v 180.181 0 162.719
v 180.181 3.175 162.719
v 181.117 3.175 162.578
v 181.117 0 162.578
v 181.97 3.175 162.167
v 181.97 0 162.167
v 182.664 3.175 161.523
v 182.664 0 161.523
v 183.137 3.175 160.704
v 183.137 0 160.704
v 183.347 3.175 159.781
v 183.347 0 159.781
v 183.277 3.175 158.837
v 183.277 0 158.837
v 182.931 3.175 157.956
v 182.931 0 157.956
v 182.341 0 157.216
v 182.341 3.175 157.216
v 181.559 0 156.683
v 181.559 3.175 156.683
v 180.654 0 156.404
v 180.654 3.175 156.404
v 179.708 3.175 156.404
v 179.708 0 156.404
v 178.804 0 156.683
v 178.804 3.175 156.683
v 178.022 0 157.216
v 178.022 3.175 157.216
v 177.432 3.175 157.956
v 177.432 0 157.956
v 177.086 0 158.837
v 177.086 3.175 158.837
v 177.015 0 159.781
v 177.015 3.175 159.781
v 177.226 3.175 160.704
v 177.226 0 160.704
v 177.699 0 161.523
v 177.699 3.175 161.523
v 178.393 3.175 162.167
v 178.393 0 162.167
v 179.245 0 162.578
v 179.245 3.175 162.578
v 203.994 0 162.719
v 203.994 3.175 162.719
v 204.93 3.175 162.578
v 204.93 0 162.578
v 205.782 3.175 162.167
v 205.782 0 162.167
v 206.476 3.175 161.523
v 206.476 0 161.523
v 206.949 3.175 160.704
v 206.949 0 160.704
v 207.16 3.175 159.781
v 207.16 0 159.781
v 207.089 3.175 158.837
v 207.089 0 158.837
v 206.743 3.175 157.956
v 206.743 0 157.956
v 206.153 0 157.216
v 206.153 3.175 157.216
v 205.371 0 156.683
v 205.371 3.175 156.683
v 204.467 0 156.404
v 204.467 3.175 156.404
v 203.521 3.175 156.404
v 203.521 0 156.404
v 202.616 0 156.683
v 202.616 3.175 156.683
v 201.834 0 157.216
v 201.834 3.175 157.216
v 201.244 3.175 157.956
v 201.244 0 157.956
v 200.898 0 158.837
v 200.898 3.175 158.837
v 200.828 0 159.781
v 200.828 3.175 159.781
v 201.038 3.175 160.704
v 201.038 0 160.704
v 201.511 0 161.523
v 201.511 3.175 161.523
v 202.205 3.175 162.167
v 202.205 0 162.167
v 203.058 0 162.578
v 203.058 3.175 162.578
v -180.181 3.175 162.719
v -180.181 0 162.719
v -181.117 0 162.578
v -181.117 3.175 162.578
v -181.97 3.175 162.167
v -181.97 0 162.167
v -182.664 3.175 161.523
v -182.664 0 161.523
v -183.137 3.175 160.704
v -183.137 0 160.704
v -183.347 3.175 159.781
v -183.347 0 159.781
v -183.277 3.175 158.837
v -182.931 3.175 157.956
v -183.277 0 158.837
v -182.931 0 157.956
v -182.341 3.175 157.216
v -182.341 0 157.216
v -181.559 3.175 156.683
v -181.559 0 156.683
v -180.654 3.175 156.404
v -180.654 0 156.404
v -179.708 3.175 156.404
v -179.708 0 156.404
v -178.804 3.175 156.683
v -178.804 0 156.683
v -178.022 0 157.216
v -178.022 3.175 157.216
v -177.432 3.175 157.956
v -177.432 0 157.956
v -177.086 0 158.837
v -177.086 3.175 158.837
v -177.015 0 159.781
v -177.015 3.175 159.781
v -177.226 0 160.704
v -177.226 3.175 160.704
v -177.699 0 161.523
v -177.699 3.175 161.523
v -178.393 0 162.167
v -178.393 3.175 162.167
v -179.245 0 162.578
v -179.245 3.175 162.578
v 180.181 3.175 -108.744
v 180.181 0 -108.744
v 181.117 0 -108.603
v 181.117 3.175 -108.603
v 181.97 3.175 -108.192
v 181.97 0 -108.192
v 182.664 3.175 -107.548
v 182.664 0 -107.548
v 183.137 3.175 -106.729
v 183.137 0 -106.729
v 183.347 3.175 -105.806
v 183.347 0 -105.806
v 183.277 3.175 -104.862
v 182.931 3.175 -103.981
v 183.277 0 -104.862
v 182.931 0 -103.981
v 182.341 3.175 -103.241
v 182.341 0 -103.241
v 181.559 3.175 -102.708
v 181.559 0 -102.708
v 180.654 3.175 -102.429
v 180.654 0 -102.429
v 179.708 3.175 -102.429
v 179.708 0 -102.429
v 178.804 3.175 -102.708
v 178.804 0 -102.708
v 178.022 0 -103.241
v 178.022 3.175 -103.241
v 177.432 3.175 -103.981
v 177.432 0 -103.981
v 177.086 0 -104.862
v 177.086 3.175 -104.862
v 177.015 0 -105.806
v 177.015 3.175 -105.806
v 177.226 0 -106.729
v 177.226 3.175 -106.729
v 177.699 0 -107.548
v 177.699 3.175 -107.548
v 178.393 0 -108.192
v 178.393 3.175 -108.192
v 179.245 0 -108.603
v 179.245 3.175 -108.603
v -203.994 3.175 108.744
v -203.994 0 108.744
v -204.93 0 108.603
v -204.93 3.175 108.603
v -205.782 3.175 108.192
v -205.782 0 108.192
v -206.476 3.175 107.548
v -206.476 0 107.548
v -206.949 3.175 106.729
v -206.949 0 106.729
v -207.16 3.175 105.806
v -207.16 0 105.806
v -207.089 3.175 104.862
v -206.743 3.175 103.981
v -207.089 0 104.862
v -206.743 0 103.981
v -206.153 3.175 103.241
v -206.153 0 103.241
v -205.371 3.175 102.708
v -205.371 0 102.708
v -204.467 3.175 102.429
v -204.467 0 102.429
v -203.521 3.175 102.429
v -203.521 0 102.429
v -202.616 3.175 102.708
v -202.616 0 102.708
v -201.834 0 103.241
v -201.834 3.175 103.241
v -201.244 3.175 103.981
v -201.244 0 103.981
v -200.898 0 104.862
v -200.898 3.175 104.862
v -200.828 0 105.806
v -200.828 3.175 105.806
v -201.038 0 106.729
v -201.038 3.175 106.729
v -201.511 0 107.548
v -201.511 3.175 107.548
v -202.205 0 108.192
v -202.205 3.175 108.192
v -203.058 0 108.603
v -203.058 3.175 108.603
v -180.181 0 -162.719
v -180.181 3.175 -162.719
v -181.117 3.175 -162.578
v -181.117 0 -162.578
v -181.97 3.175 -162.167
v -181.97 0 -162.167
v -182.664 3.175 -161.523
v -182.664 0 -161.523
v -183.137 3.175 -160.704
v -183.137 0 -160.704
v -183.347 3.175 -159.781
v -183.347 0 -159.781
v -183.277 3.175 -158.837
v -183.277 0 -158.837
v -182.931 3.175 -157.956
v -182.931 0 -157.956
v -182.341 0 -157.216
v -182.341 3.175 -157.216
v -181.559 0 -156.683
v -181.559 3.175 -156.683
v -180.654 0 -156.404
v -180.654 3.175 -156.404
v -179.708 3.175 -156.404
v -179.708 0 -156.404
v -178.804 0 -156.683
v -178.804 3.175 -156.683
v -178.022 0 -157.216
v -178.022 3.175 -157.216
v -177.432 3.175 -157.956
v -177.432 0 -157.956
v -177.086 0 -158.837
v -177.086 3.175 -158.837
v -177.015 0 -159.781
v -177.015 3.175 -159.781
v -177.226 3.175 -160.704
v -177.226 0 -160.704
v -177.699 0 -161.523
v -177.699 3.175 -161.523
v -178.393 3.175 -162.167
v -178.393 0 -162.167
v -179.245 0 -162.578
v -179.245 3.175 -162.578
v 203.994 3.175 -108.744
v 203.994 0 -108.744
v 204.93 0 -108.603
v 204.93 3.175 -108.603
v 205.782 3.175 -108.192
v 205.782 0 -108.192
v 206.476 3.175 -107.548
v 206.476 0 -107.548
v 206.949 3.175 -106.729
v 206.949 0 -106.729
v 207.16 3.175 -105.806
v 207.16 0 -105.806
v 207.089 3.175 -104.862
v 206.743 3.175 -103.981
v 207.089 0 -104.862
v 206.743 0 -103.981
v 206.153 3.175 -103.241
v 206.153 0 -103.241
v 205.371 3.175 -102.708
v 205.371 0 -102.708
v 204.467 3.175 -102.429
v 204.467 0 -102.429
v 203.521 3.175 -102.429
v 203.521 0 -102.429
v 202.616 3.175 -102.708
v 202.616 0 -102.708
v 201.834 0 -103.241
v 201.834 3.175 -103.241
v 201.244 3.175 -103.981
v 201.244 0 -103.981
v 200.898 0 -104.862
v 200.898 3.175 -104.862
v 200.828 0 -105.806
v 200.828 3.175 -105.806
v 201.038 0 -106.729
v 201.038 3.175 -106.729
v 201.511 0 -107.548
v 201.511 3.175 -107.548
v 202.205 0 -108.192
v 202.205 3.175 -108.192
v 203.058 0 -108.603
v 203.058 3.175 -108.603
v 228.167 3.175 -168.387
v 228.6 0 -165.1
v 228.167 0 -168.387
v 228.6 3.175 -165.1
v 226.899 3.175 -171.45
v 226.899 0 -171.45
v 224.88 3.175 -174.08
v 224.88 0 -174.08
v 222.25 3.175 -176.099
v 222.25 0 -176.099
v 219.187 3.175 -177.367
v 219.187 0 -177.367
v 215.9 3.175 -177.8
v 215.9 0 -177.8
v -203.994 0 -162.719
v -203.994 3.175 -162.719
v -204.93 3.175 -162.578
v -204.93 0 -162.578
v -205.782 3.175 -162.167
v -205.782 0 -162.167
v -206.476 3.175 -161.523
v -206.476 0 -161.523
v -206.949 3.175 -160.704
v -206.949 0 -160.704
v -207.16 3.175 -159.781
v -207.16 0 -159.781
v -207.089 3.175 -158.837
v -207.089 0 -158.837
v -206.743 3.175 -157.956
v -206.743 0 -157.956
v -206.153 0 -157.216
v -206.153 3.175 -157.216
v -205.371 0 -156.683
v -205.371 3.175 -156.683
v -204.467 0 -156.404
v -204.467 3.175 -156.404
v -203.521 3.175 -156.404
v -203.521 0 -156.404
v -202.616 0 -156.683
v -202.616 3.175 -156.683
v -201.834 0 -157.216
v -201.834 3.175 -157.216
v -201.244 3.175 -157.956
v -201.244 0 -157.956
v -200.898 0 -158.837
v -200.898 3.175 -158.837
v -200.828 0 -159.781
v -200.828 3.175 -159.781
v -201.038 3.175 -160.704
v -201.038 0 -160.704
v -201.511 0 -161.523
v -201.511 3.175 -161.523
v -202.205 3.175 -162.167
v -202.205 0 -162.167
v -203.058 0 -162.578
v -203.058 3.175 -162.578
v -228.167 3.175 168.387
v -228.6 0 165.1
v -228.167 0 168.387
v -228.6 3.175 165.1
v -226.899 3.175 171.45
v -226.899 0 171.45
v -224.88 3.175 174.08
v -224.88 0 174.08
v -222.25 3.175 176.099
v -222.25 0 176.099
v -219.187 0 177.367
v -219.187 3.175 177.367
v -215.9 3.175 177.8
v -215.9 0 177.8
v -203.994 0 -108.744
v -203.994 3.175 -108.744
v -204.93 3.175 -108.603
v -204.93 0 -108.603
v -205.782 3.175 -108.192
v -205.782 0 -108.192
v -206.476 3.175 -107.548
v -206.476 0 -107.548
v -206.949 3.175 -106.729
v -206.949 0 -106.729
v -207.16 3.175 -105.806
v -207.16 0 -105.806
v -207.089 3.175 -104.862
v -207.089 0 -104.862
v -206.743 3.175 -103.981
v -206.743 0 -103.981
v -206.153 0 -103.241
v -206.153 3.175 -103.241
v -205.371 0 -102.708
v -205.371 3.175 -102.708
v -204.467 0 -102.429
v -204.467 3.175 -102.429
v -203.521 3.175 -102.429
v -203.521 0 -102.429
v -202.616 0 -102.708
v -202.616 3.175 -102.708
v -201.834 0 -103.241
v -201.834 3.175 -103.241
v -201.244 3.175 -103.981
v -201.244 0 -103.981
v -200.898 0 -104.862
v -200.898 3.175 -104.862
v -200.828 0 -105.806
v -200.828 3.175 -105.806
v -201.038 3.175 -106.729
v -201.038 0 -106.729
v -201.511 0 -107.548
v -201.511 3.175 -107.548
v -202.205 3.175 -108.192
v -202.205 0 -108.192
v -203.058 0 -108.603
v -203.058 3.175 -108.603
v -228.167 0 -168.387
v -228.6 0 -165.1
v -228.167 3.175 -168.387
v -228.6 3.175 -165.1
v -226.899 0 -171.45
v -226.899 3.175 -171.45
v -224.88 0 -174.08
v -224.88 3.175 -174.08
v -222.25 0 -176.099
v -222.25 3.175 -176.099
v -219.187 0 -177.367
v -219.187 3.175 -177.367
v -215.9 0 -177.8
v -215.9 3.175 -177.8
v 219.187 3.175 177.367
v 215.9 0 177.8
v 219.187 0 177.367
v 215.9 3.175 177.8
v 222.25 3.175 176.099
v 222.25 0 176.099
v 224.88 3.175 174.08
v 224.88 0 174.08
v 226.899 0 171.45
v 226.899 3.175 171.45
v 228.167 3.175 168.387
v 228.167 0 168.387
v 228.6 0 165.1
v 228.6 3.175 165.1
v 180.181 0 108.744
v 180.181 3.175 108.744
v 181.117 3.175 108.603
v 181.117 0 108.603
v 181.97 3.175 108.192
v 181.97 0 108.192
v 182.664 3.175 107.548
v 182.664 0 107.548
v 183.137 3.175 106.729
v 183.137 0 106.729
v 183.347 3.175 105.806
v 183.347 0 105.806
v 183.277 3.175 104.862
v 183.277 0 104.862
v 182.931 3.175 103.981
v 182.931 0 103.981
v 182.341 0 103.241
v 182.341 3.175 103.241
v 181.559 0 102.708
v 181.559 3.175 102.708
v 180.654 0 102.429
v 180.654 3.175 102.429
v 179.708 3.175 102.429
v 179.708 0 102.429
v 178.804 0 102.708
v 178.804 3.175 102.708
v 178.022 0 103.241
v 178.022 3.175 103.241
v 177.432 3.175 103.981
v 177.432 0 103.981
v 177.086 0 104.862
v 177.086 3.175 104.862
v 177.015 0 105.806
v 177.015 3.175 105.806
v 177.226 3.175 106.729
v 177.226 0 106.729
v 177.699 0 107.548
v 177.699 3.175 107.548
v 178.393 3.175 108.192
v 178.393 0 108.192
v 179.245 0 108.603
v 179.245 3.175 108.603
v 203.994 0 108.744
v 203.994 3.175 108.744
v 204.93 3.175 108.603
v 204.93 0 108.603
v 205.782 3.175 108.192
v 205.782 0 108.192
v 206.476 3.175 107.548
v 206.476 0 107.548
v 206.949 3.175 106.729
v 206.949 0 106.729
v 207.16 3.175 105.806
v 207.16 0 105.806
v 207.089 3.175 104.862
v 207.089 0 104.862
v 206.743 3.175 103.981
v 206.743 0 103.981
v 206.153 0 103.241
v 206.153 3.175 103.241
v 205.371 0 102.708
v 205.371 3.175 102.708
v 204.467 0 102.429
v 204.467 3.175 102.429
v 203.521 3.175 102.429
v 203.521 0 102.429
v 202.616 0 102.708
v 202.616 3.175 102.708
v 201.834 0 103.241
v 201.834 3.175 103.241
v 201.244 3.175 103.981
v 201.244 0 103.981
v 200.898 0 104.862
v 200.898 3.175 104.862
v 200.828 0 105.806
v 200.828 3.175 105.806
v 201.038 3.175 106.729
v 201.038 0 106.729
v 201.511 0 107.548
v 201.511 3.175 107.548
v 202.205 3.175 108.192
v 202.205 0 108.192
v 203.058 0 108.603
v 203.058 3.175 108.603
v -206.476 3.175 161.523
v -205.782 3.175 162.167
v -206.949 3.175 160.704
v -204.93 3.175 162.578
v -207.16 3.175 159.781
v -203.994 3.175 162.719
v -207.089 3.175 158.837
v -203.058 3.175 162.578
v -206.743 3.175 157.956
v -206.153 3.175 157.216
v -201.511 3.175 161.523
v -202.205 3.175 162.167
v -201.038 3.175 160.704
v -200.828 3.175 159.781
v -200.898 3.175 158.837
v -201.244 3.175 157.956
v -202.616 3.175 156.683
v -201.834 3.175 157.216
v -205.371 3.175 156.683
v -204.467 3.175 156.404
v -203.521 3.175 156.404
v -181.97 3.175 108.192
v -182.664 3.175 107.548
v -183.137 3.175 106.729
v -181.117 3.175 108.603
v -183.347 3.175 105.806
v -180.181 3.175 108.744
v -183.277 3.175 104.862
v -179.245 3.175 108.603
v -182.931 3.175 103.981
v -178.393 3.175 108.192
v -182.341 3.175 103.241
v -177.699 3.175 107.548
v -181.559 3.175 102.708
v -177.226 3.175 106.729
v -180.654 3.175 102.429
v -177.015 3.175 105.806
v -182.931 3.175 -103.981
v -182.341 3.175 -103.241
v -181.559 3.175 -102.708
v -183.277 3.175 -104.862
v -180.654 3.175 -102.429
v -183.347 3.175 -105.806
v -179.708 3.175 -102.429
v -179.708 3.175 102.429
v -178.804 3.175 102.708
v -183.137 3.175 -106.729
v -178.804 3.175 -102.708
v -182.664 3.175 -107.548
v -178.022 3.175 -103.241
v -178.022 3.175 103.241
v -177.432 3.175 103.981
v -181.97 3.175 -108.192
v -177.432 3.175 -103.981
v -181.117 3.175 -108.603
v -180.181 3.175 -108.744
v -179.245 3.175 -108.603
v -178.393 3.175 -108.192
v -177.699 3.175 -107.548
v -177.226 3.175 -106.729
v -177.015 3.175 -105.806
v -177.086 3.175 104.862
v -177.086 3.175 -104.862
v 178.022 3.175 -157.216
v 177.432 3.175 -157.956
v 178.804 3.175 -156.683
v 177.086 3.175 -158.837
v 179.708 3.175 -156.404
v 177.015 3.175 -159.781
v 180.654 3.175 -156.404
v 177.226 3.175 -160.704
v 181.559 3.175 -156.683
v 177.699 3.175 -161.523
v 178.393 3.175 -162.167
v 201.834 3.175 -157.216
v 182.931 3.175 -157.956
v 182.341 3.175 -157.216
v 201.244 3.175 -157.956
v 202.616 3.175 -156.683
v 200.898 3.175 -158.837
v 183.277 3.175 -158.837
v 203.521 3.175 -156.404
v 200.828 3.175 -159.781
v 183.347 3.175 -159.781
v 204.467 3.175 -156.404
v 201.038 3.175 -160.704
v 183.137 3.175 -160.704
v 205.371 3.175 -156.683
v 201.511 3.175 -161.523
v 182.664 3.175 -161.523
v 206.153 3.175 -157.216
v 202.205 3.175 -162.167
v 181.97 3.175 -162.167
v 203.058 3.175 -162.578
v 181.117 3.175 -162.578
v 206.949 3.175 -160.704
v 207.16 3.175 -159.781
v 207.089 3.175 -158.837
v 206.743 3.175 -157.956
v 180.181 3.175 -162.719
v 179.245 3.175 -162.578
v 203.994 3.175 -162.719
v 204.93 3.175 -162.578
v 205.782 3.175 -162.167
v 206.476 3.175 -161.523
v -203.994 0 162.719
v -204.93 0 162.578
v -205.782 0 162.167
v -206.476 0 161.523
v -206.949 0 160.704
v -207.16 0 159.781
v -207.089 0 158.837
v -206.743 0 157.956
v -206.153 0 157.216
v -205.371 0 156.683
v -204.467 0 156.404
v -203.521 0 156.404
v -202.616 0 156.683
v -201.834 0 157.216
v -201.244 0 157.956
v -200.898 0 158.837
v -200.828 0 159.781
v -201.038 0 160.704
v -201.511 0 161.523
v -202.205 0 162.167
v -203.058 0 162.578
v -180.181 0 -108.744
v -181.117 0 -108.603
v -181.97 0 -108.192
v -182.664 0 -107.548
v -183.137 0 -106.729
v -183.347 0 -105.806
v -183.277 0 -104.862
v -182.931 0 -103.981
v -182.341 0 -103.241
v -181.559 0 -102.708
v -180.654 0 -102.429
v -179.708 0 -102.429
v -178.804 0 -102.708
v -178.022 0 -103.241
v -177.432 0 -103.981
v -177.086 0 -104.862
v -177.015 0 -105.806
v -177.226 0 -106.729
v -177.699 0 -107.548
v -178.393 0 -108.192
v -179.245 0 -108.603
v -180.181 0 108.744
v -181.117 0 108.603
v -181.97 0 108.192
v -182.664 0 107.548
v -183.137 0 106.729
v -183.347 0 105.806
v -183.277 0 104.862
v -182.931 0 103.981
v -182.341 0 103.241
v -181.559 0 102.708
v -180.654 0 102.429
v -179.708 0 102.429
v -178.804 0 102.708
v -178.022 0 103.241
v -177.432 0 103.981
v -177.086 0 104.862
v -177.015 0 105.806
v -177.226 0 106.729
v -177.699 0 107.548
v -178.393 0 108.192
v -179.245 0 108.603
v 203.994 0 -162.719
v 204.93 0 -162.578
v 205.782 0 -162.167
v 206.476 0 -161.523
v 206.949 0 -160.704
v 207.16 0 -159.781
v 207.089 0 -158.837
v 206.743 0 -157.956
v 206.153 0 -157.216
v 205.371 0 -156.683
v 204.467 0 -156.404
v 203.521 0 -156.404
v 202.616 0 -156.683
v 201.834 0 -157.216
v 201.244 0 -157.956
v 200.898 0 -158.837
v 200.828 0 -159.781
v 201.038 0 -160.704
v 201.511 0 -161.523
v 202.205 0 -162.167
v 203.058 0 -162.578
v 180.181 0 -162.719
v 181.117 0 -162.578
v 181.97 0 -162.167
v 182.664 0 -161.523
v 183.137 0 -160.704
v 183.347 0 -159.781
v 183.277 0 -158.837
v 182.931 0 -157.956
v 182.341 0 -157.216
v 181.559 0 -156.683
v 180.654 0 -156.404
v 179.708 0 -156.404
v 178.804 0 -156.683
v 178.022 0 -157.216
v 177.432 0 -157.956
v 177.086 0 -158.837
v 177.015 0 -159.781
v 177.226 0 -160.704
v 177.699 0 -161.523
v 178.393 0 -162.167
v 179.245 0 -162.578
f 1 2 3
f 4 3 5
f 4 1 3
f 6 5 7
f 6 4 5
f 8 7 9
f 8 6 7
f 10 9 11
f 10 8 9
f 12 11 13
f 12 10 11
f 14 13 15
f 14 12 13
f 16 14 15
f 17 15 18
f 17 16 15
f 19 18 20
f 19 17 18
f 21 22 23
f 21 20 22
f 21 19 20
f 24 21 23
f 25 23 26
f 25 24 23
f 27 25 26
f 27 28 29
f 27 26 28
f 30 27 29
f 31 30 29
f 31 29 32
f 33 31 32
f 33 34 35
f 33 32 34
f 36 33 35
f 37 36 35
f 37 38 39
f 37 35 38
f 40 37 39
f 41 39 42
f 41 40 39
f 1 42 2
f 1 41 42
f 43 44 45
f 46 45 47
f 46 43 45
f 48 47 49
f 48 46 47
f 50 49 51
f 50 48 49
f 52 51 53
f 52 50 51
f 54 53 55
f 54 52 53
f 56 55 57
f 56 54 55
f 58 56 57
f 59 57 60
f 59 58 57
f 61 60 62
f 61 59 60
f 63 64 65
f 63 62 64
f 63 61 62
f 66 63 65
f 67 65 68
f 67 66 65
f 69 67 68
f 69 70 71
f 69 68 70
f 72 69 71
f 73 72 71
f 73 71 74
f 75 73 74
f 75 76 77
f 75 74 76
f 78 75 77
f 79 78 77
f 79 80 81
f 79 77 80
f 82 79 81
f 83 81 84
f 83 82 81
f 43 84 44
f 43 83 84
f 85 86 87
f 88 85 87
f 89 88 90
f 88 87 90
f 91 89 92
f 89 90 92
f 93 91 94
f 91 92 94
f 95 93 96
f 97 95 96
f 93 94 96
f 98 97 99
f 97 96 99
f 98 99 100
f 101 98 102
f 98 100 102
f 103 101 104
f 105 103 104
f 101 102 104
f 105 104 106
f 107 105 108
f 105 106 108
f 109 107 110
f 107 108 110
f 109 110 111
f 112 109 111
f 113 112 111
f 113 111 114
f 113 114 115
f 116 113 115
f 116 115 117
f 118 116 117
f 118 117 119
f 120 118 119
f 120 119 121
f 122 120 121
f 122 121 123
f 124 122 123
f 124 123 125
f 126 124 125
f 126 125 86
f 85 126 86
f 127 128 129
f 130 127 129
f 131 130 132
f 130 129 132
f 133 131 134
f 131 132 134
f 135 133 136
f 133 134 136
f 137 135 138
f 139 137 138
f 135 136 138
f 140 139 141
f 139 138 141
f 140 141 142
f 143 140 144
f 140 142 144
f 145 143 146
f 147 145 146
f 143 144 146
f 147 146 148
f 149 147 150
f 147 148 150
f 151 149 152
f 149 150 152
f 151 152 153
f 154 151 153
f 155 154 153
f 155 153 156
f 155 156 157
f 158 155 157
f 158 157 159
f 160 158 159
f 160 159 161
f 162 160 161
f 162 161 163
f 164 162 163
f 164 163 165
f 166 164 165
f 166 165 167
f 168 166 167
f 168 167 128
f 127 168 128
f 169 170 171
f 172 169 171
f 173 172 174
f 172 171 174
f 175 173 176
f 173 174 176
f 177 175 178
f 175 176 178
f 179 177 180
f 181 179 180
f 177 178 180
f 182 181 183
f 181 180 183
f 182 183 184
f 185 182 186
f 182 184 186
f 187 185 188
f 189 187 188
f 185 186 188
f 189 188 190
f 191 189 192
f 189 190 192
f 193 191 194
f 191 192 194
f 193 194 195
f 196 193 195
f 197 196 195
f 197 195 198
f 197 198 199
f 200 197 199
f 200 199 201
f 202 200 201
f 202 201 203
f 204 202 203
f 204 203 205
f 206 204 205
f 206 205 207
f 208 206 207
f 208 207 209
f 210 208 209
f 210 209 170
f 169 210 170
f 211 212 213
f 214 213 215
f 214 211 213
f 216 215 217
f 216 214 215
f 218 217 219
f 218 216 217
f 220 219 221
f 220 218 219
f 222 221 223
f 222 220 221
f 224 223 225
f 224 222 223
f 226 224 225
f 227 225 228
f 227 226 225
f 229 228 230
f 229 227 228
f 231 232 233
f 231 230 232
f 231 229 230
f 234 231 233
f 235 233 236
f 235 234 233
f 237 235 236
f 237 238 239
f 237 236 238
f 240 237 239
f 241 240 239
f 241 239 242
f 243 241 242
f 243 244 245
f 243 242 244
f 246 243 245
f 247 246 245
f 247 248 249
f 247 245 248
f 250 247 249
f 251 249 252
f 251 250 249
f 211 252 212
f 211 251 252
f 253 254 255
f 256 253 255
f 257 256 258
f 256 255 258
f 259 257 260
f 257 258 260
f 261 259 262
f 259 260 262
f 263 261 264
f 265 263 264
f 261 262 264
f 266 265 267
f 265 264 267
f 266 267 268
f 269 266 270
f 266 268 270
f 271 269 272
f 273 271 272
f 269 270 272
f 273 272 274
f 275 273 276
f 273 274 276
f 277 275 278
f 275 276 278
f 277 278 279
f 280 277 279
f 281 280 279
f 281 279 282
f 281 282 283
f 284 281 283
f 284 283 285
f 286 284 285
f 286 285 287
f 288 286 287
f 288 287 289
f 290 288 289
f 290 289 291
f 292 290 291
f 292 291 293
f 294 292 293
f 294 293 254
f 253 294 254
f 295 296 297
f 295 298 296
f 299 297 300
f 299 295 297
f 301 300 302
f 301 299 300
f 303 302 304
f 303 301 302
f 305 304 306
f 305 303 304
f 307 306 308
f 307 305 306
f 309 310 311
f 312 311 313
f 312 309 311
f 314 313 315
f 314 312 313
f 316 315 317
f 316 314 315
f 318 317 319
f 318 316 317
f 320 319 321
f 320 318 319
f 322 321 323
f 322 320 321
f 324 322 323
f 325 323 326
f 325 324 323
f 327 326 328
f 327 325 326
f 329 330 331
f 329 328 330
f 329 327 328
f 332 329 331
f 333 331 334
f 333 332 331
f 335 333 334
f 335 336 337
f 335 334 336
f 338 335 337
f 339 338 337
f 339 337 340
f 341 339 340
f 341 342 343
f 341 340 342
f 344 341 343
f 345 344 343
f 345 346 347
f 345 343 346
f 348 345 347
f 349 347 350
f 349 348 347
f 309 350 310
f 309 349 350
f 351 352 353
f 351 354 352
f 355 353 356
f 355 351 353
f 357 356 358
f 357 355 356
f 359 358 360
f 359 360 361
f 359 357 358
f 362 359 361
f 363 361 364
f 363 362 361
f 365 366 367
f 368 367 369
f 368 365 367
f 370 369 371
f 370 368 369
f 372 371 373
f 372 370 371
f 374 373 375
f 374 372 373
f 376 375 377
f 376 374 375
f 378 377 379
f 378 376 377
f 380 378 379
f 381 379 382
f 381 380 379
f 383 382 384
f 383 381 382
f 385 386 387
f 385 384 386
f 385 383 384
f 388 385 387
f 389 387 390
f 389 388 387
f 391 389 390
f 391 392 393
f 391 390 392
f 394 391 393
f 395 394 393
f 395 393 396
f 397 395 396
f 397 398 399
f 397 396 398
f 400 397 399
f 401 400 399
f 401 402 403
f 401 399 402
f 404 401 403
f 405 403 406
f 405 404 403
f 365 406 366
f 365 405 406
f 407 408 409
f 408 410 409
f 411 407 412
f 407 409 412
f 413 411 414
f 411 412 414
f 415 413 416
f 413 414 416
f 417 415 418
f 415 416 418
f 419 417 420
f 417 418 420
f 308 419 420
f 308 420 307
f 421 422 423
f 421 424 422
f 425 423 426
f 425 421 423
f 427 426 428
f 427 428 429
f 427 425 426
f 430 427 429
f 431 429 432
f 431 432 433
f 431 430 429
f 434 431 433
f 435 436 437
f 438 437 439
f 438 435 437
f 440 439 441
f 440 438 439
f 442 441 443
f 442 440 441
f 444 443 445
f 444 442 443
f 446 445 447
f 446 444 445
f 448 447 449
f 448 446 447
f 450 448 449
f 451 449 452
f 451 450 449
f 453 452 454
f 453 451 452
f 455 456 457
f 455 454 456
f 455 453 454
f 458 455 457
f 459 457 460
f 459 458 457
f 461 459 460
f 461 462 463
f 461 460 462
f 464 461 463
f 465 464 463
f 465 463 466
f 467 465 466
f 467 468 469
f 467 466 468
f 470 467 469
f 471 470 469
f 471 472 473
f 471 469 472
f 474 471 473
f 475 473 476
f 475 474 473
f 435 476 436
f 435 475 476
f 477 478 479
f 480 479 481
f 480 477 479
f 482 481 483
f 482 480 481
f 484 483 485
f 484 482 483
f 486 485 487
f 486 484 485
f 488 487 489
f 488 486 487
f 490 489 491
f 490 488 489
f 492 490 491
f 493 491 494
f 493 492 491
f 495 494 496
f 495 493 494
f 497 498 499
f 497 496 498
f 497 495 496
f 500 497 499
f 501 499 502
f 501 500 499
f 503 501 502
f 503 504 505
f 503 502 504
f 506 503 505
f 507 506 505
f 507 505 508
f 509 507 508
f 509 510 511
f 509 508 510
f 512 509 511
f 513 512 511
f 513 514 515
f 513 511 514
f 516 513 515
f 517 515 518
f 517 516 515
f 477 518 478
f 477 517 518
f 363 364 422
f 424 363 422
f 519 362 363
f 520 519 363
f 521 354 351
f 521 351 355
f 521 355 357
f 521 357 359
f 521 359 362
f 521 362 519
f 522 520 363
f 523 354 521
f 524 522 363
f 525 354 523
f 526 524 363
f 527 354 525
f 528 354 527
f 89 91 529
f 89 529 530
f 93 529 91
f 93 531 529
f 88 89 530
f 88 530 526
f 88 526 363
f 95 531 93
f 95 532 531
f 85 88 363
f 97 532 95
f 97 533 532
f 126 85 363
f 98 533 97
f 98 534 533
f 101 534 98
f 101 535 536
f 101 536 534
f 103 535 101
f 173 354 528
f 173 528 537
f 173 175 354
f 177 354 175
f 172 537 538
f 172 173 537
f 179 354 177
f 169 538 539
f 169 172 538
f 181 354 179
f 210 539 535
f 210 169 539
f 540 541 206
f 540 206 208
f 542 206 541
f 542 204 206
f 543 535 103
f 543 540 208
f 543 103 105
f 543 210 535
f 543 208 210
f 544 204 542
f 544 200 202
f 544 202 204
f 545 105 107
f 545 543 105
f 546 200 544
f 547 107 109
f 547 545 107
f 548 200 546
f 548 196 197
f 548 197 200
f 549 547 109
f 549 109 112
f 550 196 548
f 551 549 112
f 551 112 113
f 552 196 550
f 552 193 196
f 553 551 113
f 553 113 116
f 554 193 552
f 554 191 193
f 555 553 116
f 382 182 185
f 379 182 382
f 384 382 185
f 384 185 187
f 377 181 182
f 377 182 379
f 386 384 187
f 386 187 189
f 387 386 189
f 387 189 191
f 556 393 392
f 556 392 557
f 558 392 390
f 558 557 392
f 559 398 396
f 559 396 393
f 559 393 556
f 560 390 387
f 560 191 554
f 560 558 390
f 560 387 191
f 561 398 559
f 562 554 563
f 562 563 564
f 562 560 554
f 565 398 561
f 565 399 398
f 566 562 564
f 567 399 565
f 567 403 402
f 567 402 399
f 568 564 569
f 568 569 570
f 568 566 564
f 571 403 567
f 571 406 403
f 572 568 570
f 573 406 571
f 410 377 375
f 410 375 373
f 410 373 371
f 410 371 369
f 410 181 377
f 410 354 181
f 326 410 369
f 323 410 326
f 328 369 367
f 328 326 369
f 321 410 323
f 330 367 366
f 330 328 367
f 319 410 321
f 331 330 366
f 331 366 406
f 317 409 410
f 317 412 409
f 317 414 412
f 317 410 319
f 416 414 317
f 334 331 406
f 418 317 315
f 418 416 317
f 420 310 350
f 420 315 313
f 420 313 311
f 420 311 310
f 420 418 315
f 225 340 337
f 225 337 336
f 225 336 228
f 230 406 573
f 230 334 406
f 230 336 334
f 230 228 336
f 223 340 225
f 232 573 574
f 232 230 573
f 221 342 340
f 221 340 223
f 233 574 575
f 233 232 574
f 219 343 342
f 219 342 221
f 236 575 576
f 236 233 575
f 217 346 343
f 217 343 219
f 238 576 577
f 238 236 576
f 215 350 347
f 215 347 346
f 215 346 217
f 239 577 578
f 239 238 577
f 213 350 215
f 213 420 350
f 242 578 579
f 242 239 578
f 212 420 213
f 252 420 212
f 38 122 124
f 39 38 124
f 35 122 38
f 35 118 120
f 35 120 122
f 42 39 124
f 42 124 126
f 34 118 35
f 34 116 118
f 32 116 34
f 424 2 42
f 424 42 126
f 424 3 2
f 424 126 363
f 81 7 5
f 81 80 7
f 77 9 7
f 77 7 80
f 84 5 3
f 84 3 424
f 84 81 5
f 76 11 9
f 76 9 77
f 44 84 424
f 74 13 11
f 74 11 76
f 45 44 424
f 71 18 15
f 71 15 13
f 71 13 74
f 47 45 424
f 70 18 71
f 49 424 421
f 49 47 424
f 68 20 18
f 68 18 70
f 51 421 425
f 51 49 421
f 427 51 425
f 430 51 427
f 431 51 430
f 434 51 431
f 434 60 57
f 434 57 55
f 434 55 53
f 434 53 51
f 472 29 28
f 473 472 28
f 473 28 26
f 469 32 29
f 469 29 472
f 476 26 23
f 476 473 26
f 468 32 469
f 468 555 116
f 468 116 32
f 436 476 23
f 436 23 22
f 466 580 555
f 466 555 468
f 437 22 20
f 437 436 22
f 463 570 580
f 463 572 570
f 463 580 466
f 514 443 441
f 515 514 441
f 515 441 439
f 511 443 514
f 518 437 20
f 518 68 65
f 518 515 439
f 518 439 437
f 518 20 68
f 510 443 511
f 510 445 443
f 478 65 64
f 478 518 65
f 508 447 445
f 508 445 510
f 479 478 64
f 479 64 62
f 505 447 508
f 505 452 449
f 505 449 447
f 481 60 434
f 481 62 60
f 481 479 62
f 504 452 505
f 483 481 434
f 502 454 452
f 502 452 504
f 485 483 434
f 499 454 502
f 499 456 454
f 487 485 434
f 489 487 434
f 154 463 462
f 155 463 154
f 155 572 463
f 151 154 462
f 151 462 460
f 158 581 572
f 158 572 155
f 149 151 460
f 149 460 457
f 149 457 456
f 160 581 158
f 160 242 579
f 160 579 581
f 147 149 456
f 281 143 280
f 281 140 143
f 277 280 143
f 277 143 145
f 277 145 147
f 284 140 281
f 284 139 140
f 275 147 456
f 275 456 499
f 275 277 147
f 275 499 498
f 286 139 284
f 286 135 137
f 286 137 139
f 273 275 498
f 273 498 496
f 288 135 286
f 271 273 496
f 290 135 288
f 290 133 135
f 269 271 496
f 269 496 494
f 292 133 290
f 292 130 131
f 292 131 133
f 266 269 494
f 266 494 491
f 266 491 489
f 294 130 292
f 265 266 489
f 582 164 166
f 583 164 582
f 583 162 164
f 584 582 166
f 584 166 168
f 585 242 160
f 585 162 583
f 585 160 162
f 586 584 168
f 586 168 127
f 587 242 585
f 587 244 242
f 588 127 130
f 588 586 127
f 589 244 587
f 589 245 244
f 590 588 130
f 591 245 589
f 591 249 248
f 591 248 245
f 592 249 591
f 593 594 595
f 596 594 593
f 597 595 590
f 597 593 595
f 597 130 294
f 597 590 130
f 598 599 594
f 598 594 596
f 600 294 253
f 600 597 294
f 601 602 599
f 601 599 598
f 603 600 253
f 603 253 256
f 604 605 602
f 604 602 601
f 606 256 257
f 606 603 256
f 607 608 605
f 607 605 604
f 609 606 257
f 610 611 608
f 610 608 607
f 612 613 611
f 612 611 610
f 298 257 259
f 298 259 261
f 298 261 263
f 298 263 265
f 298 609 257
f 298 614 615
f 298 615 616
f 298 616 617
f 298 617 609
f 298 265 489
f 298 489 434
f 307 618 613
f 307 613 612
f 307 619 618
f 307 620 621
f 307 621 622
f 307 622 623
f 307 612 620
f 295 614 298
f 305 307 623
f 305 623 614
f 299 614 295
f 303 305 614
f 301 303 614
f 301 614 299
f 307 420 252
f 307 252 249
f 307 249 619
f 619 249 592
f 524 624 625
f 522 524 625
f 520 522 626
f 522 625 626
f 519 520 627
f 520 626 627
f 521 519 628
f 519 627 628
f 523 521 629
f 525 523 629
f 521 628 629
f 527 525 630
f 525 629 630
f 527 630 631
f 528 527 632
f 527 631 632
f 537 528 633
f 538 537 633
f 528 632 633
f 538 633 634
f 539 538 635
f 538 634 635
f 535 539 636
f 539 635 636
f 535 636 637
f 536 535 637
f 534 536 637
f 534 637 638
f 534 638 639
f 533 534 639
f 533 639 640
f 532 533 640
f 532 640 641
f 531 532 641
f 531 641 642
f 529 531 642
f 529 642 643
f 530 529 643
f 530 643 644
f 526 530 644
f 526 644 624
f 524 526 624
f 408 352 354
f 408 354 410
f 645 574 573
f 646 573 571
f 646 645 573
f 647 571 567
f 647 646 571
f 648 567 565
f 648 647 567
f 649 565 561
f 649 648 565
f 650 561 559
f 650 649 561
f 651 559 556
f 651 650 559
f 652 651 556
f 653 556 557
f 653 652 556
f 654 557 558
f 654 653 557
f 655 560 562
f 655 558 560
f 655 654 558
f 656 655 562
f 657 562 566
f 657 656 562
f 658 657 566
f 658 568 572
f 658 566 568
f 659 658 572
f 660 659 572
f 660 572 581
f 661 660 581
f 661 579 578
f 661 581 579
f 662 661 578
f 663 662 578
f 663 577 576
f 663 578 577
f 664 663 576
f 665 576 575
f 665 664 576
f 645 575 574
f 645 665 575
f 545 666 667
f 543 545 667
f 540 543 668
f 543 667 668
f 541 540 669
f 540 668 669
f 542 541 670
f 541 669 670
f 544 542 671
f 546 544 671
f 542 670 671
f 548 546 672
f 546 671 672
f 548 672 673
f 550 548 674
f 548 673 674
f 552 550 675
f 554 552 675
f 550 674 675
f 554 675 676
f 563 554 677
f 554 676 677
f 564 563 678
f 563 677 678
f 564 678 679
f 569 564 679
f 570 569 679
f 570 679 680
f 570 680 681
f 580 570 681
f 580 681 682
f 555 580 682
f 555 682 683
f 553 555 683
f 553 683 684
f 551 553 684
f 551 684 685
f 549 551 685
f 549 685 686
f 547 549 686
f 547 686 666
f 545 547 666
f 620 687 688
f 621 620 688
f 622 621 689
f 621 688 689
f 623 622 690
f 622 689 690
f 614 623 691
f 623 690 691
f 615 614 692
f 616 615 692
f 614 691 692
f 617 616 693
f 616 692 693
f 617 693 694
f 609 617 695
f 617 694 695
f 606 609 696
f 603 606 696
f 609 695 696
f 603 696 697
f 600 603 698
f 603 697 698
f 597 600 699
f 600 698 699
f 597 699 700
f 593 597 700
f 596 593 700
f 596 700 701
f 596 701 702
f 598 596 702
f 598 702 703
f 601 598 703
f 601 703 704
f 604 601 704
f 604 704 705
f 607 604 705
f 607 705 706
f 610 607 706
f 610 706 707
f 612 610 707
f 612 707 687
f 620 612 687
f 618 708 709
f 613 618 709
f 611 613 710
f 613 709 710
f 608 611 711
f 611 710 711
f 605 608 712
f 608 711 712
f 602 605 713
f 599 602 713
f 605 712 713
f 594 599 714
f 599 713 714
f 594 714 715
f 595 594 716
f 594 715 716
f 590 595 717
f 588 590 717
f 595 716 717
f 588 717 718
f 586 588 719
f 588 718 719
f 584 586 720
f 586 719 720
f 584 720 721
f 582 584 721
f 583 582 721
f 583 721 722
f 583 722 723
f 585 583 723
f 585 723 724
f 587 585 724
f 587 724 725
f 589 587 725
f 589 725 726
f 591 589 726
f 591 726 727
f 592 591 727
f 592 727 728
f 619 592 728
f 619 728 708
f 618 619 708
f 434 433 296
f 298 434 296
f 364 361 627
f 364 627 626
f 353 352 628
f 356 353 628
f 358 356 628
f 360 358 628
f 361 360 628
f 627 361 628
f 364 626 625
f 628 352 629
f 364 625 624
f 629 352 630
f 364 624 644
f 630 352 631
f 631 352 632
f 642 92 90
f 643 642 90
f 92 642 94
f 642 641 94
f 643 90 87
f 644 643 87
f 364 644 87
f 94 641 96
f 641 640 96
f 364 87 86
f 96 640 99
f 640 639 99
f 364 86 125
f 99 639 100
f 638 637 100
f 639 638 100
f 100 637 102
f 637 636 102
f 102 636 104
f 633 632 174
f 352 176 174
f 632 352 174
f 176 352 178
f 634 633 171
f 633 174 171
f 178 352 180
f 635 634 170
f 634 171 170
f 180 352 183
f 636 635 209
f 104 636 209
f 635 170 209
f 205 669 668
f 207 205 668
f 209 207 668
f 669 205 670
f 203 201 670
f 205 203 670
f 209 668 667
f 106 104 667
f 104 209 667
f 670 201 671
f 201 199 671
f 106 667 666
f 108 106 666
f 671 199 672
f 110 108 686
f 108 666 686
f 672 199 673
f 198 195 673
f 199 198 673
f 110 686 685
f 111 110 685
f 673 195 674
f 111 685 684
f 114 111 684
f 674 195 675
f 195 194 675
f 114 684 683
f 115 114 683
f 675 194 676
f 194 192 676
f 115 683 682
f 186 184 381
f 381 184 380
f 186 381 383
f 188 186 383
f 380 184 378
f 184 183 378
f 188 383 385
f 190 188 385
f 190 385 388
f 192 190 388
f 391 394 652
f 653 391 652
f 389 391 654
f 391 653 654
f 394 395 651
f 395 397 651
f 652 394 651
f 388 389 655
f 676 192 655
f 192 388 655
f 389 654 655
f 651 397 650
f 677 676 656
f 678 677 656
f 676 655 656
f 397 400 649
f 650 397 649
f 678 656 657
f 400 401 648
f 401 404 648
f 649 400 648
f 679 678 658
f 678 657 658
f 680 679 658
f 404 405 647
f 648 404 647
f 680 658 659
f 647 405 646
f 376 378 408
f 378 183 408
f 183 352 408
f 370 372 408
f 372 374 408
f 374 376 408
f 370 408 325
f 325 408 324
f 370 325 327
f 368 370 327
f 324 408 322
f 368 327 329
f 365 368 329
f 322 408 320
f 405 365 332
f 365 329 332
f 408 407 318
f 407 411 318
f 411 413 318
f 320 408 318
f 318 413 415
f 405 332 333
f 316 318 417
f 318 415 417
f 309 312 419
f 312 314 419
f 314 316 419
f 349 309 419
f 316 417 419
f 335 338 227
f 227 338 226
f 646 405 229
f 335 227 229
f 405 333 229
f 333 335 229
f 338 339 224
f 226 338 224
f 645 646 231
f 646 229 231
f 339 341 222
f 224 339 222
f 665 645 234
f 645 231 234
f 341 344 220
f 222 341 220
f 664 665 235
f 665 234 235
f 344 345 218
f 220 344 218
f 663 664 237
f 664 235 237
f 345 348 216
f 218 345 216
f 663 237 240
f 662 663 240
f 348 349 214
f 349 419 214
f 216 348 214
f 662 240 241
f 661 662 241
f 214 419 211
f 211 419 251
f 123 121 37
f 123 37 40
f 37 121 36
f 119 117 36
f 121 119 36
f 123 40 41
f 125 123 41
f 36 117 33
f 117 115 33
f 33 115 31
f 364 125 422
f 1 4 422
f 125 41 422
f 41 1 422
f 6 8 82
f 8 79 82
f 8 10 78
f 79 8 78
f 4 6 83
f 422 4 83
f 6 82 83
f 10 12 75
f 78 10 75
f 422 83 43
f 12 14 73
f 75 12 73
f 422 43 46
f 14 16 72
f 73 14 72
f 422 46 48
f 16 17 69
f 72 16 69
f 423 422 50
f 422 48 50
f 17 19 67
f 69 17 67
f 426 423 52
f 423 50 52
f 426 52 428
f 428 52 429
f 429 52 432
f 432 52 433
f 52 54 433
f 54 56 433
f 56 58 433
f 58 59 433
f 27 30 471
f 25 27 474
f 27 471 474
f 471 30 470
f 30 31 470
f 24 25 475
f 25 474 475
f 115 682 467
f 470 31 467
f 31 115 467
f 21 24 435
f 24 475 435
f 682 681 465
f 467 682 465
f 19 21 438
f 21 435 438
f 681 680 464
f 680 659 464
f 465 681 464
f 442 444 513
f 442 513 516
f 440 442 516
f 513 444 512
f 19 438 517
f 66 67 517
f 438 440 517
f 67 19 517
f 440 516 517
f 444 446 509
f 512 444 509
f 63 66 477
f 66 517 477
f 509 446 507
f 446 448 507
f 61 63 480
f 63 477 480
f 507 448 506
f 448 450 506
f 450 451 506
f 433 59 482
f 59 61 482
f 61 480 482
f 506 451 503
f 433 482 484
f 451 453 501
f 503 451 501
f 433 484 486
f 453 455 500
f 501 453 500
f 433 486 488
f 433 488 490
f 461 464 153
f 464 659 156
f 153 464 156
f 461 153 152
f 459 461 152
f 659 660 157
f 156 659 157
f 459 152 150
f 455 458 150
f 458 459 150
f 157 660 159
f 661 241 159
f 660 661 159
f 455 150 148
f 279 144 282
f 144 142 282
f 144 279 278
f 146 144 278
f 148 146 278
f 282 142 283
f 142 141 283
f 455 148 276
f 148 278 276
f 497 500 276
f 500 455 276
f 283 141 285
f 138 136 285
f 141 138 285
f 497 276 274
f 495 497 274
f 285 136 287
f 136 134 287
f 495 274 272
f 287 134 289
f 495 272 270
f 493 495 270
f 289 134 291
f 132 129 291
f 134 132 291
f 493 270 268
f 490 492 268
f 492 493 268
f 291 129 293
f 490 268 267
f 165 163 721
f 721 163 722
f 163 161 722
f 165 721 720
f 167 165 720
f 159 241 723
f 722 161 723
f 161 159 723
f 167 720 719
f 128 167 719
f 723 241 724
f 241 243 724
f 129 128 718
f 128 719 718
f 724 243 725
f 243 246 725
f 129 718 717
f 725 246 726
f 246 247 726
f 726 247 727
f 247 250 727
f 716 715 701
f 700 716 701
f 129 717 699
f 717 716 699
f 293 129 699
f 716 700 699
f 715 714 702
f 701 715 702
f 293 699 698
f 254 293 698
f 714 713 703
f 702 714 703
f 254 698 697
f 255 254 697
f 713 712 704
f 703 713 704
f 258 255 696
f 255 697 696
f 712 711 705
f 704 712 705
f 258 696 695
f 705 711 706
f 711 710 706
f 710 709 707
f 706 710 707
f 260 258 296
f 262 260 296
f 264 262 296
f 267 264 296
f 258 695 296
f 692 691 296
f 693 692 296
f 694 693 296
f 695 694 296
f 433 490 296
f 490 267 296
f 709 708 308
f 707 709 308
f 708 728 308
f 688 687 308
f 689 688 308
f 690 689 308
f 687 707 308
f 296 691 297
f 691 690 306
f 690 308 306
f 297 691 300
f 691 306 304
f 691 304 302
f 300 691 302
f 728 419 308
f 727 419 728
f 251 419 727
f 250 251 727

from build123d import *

# Parameters (mm, degrees)
SKETCH1_W               = 457.2
SKETCH1_H               = 355.6
BOSS_EXTRUDE1_DEPTH     = 3.175
FILLET1_R               = 12.7
SKETCH3_R               = 3.175
CUT_EXTRUDE1_DEPTH      = 290.621961572
MIRROR2_COPY_1_SKETCH_R = 3.175
MIRROR2_COPY_1_DEPTH    = 290.621961572


with BuildPart() as part:
    # Sketch1 → Boss-Extrude1 (new body)
    with BuildSketch(Plane(origin=(0, 0, 0), x_dir=(1, 0, 0), z_dir=(0, 1, 0))):
        Rectangle(SKETCH1_W, SKETCH1_H)
    extrude(amount=BOSS_EXTRUDE1_DEPTH)

    # Fillet1
    fillet1_edges = [part.edges().sort_by_distance(p)[0] for p in [
        (-228.6, 1.5875, 177.8),
        (228.6, 1.5875, 177.8),
        (228.6, 1.5875, -177.8),
        (-228.6, 1.5875, -177.8),
    ]]
    fillet(fillet1_edges, radius=FILLET1_R)

    # Sketch3 → Cut-Extrude1 (cut, through all)
    with BuildSketch(Plane.XZ):
        with Locations(Location((180.18125, -159.54375, 0), (0, 0, 270))):
            Circle(SKETCH3_R)
        with Locations(Location((180.18125, -105.56875, 0), (0, 0, 270))):
            Circle(SKETCH3_R)
        with Locations(Location((203.99375, -159.54375, 0), (0, 0, 270))):
            Circle(SKETCH3_R)
        with Locations(Location((203.99375, -105.56875, 0), (0, 0, 270))):
            Circle(SKETCH3_R)
    cut_extrude1 = extrude(amount=-CUT_EXTRUDE1_DEPTH, mode=Mode.SUBTRACT)

    # Mirror1: Cut-Extrude1 across plane
    add(cut_extrude1.mirror(Plane.XY), mode=Mode.SUBTRACT)

    # Mirror2: Cut-Extrude1 across plane
    add(cut_extrude1.mirror(Plane(origin=(0, 0, 0), x_dir=(0, 0, 1), z_dir=(1, 0, 0))), mode=Mode.SUBTRACT)

    # Mirror2 copy 1 sketch → Mirror2 copy 1 (cut, through all)
    with BuildSketch(Plane(origin=(0, 0, 0), x_dir=(-1, 0, 0), z_dir=(0, -1, 0))):
        with Locations(Location((180.18125, -159.54375, 0), (0, 0, 270))):
            Circle(MIRROR2_COPY_1_SKETCH_R)
        with Locations(Location((180.18125, -105.56875, 0), (0, 0, 270))):
            Circle(MIRROR2_COPY_1_SKETCH_R)
        with Locations(Location((203.99375, -159.54375, 0), (0, 0, 270))):
            Circle(MIRROR2_COPY_1_SKETCH_R)
        with Locations(Location((203.99375, -105.56875, 0), (0, 0, 270))):
            Circle(MIRROR2_COPY_1_SKETCH_R)
    extrude(amount=-MIRROR2_COPY_1_DEPTH, mode=Mode.SUBTRACT)


solid = part.part
